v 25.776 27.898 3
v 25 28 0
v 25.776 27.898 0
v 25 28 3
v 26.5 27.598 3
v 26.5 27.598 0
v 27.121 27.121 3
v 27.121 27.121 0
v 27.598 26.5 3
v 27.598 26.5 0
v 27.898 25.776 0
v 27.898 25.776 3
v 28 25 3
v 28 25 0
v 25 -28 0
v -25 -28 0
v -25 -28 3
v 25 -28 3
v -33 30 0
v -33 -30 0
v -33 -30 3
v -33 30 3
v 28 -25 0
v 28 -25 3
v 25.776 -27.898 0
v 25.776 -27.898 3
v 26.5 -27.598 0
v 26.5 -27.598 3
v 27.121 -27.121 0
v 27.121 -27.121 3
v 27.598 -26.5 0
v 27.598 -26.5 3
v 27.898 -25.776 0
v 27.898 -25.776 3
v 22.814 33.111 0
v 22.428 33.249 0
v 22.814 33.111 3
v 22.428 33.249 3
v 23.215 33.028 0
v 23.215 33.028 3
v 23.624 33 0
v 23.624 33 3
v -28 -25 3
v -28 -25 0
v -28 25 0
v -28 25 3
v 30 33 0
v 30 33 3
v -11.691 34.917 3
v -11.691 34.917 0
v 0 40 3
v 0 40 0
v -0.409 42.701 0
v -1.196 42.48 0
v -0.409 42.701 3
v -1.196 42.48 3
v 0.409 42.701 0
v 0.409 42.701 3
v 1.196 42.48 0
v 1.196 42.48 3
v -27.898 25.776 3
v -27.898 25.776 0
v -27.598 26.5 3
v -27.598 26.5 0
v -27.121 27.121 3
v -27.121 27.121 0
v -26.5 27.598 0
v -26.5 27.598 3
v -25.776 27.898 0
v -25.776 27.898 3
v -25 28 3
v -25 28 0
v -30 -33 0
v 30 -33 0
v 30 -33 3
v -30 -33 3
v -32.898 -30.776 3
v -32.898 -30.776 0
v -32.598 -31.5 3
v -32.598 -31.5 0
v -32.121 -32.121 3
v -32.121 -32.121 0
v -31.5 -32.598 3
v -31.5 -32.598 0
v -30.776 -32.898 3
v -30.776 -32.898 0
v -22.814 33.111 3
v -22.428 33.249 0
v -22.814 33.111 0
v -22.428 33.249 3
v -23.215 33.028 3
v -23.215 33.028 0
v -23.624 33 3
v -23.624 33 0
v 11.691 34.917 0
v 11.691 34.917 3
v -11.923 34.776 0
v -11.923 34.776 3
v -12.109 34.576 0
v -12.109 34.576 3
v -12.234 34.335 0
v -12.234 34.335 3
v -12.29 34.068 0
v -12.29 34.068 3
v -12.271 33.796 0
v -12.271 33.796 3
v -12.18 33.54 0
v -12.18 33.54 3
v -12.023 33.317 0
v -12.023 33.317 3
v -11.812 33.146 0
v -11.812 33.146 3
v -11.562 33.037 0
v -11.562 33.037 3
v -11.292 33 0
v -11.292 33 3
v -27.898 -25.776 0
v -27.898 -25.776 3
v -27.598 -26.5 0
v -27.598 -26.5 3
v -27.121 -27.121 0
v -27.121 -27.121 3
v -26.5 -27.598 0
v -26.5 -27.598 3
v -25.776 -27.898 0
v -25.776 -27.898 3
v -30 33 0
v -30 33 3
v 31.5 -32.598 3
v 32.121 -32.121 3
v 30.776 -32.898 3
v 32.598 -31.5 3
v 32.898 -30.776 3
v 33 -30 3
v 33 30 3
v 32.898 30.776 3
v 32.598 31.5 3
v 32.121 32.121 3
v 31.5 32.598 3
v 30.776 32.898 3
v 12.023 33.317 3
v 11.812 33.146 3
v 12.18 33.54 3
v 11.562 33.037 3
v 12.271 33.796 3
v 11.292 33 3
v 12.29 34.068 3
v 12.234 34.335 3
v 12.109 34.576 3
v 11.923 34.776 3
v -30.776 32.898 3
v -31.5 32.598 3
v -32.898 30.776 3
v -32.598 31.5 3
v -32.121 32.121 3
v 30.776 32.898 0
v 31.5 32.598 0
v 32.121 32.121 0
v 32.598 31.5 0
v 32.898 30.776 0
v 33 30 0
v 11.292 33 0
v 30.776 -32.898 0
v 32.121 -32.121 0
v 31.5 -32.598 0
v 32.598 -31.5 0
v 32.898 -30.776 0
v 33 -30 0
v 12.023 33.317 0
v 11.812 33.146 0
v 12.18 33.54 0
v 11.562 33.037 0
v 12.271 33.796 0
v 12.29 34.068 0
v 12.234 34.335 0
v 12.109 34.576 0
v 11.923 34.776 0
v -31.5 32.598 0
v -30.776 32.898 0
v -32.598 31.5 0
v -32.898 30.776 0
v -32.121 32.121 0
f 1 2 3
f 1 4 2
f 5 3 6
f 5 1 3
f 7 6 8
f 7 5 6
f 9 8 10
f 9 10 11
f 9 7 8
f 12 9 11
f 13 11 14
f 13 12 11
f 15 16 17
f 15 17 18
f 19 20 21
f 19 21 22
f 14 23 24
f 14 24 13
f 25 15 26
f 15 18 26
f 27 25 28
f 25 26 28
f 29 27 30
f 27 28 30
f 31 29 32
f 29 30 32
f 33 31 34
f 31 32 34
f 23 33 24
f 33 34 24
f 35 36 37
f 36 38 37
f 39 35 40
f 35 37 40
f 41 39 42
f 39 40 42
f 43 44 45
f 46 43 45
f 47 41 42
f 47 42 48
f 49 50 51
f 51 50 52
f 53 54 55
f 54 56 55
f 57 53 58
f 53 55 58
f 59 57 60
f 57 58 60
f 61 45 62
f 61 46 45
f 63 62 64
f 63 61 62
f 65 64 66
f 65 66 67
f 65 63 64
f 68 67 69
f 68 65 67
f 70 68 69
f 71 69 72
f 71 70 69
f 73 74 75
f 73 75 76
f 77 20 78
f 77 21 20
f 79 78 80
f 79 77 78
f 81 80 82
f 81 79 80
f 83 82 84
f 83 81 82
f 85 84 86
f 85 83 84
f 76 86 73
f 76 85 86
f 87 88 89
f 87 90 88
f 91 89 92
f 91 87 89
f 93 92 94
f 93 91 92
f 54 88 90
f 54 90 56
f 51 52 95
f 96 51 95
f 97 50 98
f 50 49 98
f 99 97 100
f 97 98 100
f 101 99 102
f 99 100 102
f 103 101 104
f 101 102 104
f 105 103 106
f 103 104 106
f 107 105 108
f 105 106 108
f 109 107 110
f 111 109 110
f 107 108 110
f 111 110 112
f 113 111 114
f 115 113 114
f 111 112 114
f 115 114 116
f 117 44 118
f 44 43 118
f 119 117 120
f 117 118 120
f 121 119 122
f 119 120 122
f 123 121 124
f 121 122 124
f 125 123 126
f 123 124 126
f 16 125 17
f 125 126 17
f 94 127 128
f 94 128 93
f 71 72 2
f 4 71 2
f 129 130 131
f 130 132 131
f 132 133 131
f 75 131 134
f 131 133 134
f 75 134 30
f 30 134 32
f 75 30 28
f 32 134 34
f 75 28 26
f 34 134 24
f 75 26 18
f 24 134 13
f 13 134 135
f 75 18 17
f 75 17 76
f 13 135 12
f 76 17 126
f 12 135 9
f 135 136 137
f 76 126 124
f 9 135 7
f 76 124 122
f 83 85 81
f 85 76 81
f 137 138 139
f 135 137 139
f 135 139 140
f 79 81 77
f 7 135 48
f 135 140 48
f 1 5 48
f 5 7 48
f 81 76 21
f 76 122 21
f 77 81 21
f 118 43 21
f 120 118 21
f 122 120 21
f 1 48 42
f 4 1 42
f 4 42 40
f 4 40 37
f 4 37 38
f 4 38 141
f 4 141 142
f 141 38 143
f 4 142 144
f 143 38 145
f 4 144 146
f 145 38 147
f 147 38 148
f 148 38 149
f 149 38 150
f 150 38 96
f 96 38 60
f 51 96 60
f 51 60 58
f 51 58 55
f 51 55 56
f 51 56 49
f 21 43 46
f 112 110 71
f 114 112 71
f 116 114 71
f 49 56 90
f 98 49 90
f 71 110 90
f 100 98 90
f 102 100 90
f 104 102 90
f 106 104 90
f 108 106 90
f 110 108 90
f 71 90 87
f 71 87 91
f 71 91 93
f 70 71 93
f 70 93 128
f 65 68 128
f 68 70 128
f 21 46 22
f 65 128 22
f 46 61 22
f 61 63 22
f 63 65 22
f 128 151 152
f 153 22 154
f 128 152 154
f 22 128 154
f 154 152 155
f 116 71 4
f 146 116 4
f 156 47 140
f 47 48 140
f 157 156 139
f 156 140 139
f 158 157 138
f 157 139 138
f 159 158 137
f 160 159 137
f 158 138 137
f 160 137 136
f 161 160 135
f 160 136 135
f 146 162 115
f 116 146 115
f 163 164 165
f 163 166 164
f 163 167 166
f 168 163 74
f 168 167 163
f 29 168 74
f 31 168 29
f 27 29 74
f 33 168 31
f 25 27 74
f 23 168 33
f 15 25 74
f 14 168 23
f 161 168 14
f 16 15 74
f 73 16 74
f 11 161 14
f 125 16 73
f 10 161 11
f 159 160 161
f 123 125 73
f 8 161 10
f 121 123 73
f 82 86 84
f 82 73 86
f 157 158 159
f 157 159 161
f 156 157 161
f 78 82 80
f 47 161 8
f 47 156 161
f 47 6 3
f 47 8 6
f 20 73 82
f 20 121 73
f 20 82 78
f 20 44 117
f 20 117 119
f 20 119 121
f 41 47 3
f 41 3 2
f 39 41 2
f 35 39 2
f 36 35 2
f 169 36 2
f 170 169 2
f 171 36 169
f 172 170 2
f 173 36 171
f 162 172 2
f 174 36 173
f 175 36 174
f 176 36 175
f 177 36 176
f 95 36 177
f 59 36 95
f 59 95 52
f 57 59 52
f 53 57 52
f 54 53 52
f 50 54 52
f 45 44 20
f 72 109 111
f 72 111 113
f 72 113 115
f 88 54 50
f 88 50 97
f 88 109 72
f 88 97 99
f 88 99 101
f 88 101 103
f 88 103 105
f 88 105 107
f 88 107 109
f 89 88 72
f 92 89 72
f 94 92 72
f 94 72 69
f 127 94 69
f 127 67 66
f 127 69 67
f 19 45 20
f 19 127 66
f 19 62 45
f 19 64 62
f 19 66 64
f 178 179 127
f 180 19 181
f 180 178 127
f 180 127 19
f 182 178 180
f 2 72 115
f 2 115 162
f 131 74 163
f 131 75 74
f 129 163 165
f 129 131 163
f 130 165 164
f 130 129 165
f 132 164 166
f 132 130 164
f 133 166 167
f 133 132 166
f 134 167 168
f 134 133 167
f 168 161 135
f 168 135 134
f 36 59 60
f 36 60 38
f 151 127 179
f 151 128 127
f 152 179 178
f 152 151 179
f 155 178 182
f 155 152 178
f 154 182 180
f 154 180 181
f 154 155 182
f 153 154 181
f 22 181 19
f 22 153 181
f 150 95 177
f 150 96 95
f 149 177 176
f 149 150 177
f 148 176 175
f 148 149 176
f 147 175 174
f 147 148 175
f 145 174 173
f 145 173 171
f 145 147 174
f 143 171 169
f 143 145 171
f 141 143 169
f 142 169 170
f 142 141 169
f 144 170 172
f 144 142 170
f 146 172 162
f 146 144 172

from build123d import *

# Parameters (mm, degrees)
SKETCH1_W           = 56
SKETCH1_H           = 56
BOSS_EXTRUDE1_DEPTH = 3
FILLET1_R           = 3
FILLET2_R           = 1


with BuildPart() as part:
    # Sketch1 → Boss-Extrude1 (new body)
    with BuildSketch(Plane.XY):
        Polygon((-23, 33), (0, 43), (23, 33), (33, 33), (33, -33), (-33, -33), (-33, 33), align=None)
        Rectangle(SKETCH1_W, SKETCH1_H, mode=Mode.SUBTRACT)
        Polygon((-16.1, 33), (0, 40), (16.1, 33), align=None, mode=Mode.SUBTRACT)
    extrude(amount=BOSS_EXTRUDE1_DEPTH)

    # Fillet1
    fillet1_edges = [part.edges().sort_by_distance(p)[0] for p in [
        (33, -33, 1.5),
        (-33, -33, 1.5),
        (-33, 33, 1.5),
        (-23, 33, 1.5),
        (0, 43, 1.5),
        (23, 33, 1.5),
        (33, 33, 1.5),
        (28, -28, 1.5),
        (28, 28, 1.5),
        (-28, 28, 1.5),
        (-28, -28, 1.5),
    ]]
    fillet(fillet1_edges, radius=FILLET1_R)

    # Fillet2
    fillet2_edges = [part.edges().sort_by_distance(p)[0] for p in [
        (-16.1, 33, 1.5),
        (16.1, 33, 1.5),
    ]]
    fillet(fillet2_edges, radius=FILLET2_R)


solid = part.part
